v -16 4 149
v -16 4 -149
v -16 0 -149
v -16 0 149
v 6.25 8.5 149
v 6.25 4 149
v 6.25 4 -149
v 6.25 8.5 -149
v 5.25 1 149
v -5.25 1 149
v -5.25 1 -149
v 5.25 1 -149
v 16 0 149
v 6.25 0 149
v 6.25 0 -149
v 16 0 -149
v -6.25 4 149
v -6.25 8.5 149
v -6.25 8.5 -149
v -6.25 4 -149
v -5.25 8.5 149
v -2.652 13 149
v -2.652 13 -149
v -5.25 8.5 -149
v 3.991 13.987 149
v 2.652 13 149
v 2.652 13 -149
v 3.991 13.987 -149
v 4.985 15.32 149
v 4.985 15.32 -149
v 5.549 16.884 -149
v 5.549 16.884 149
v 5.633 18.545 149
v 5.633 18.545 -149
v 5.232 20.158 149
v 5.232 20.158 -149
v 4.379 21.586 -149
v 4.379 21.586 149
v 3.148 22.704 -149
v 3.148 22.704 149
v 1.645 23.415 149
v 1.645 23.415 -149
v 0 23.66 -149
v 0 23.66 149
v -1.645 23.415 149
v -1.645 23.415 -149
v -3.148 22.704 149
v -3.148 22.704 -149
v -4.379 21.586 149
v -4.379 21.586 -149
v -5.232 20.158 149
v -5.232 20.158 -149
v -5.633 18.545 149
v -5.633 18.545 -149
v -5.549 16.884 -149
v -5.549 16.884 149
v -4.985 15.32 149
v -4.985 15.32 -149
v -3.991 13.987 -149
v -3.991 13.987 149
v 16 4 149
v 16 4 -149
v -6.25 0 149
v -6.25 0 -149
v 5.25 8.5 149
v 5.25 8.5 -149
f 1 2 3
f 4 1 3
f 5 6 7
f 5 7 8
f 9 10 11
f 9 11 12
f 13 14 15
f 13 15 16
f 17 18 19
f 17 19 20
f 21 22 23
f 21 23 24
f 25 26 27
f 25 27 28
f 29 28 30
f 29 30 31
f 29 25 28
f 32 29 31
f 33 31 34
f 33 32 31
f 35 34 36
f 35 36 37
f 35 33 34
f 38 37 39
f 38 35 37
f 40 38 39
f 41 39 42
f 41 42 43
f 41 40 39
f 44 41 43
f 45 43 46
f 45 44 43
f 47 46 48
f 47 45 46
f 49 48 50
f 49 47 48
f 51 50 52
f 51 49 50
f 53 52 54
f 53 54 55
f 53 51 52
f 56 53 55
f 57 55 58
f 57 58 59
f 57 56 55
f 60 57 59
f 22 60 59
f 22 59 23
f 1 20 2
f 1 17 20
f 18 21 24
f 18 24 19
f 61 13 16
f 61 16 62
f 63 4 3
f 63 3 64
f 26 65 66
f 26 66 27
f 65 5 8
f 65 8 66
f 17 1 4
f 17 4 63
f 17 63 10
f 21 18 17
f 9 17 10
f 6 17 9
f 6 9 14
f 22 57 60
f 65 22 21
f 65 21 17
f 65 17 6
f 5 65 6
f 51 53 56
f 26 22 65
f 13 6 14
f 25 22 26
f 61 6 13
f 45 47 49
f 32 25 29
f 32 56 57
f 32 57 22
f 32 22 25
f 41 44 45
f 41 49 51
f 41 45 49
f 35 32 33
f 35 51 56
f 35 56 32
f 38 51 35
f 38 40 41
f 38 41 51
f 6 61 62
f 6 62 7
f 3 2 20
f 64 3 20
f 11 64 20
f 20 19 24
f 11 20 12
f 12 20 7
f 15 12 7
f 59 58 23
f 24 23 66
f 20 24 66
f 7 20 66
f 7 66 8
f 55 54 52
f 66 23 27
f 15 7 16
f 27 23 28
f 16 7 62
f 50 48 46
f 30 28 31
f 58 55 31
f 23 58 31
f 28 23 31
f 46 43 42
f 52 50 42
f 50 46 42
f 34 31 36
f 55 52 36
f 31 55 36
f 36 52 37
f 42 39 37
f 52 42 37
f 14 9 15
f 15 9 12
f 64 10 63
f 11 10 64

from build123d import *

# Parameters (mm, degrees)
EXTRUDE_1_DEPTH     = 149
SKETCH_2_W          = 10.5
SKETCH_2_H          = 1
CUT_EXTRUDE_1_DEPTH = 300.365635096
CHAMFER_1_SIZE      = 1


with BuildPart() as part:
    # 草图1 → 凸台-拉伸1 (new, symmetric)
    with BuildSketch(Plane.XY):
        with BuildLine():
            Line((-16, 0), (16, 0))
            Line((16, 0), (16, 4))
            Line((16, 4), (6.25, 4))
            Line((6.25, 4), (6.25, 8.5))
            Line((6.25, 8.5), (5.25, 8.5))
            Line((5.25, 8.5), (2.651923789, 13))
            ThreePointArc((2.651923789, 13), (0, 23.659743791), (-2.651923789, 13))
            Line((-2.651923789, 13), (-5.25, 8.5))
            Line((-5.25, 8.5), (-6.25, 8.5))
            Line((-6.25, 8.5), (-6.25, 4))
            Line((-6.25, 4), (-16, 4))
            Line((-16, 4), (-16, 0))
        make_face()
    extrude(amount=EXTRUDE_1_DEPTH, both=True)

    # 草图2 → 切除-拉伸1 (cut, through all)
    with BuildSketch(Plane.XY.offset(149)):
        with Locations((0, 0.5)):
            Rectangle(SKETCH_2_W, SKETCH_2_H)
    extrude(amount=-CUT_EXTRUDE_1_DEPTH, mode=Mode.SUBTRACT)

    # 倒角1
    chamfer_1_edges = [part.edges().sort_by_distance(p)[0] for p in [
        (5.25, 0, 0),
        (-5.25, 0, 0),
    ]]
    chamfer(chamfer_1_edges, length=CHAMFER_1_SIZE - 0.0001)  # a hair under: the kernel refuses the full size


solid = part.part
